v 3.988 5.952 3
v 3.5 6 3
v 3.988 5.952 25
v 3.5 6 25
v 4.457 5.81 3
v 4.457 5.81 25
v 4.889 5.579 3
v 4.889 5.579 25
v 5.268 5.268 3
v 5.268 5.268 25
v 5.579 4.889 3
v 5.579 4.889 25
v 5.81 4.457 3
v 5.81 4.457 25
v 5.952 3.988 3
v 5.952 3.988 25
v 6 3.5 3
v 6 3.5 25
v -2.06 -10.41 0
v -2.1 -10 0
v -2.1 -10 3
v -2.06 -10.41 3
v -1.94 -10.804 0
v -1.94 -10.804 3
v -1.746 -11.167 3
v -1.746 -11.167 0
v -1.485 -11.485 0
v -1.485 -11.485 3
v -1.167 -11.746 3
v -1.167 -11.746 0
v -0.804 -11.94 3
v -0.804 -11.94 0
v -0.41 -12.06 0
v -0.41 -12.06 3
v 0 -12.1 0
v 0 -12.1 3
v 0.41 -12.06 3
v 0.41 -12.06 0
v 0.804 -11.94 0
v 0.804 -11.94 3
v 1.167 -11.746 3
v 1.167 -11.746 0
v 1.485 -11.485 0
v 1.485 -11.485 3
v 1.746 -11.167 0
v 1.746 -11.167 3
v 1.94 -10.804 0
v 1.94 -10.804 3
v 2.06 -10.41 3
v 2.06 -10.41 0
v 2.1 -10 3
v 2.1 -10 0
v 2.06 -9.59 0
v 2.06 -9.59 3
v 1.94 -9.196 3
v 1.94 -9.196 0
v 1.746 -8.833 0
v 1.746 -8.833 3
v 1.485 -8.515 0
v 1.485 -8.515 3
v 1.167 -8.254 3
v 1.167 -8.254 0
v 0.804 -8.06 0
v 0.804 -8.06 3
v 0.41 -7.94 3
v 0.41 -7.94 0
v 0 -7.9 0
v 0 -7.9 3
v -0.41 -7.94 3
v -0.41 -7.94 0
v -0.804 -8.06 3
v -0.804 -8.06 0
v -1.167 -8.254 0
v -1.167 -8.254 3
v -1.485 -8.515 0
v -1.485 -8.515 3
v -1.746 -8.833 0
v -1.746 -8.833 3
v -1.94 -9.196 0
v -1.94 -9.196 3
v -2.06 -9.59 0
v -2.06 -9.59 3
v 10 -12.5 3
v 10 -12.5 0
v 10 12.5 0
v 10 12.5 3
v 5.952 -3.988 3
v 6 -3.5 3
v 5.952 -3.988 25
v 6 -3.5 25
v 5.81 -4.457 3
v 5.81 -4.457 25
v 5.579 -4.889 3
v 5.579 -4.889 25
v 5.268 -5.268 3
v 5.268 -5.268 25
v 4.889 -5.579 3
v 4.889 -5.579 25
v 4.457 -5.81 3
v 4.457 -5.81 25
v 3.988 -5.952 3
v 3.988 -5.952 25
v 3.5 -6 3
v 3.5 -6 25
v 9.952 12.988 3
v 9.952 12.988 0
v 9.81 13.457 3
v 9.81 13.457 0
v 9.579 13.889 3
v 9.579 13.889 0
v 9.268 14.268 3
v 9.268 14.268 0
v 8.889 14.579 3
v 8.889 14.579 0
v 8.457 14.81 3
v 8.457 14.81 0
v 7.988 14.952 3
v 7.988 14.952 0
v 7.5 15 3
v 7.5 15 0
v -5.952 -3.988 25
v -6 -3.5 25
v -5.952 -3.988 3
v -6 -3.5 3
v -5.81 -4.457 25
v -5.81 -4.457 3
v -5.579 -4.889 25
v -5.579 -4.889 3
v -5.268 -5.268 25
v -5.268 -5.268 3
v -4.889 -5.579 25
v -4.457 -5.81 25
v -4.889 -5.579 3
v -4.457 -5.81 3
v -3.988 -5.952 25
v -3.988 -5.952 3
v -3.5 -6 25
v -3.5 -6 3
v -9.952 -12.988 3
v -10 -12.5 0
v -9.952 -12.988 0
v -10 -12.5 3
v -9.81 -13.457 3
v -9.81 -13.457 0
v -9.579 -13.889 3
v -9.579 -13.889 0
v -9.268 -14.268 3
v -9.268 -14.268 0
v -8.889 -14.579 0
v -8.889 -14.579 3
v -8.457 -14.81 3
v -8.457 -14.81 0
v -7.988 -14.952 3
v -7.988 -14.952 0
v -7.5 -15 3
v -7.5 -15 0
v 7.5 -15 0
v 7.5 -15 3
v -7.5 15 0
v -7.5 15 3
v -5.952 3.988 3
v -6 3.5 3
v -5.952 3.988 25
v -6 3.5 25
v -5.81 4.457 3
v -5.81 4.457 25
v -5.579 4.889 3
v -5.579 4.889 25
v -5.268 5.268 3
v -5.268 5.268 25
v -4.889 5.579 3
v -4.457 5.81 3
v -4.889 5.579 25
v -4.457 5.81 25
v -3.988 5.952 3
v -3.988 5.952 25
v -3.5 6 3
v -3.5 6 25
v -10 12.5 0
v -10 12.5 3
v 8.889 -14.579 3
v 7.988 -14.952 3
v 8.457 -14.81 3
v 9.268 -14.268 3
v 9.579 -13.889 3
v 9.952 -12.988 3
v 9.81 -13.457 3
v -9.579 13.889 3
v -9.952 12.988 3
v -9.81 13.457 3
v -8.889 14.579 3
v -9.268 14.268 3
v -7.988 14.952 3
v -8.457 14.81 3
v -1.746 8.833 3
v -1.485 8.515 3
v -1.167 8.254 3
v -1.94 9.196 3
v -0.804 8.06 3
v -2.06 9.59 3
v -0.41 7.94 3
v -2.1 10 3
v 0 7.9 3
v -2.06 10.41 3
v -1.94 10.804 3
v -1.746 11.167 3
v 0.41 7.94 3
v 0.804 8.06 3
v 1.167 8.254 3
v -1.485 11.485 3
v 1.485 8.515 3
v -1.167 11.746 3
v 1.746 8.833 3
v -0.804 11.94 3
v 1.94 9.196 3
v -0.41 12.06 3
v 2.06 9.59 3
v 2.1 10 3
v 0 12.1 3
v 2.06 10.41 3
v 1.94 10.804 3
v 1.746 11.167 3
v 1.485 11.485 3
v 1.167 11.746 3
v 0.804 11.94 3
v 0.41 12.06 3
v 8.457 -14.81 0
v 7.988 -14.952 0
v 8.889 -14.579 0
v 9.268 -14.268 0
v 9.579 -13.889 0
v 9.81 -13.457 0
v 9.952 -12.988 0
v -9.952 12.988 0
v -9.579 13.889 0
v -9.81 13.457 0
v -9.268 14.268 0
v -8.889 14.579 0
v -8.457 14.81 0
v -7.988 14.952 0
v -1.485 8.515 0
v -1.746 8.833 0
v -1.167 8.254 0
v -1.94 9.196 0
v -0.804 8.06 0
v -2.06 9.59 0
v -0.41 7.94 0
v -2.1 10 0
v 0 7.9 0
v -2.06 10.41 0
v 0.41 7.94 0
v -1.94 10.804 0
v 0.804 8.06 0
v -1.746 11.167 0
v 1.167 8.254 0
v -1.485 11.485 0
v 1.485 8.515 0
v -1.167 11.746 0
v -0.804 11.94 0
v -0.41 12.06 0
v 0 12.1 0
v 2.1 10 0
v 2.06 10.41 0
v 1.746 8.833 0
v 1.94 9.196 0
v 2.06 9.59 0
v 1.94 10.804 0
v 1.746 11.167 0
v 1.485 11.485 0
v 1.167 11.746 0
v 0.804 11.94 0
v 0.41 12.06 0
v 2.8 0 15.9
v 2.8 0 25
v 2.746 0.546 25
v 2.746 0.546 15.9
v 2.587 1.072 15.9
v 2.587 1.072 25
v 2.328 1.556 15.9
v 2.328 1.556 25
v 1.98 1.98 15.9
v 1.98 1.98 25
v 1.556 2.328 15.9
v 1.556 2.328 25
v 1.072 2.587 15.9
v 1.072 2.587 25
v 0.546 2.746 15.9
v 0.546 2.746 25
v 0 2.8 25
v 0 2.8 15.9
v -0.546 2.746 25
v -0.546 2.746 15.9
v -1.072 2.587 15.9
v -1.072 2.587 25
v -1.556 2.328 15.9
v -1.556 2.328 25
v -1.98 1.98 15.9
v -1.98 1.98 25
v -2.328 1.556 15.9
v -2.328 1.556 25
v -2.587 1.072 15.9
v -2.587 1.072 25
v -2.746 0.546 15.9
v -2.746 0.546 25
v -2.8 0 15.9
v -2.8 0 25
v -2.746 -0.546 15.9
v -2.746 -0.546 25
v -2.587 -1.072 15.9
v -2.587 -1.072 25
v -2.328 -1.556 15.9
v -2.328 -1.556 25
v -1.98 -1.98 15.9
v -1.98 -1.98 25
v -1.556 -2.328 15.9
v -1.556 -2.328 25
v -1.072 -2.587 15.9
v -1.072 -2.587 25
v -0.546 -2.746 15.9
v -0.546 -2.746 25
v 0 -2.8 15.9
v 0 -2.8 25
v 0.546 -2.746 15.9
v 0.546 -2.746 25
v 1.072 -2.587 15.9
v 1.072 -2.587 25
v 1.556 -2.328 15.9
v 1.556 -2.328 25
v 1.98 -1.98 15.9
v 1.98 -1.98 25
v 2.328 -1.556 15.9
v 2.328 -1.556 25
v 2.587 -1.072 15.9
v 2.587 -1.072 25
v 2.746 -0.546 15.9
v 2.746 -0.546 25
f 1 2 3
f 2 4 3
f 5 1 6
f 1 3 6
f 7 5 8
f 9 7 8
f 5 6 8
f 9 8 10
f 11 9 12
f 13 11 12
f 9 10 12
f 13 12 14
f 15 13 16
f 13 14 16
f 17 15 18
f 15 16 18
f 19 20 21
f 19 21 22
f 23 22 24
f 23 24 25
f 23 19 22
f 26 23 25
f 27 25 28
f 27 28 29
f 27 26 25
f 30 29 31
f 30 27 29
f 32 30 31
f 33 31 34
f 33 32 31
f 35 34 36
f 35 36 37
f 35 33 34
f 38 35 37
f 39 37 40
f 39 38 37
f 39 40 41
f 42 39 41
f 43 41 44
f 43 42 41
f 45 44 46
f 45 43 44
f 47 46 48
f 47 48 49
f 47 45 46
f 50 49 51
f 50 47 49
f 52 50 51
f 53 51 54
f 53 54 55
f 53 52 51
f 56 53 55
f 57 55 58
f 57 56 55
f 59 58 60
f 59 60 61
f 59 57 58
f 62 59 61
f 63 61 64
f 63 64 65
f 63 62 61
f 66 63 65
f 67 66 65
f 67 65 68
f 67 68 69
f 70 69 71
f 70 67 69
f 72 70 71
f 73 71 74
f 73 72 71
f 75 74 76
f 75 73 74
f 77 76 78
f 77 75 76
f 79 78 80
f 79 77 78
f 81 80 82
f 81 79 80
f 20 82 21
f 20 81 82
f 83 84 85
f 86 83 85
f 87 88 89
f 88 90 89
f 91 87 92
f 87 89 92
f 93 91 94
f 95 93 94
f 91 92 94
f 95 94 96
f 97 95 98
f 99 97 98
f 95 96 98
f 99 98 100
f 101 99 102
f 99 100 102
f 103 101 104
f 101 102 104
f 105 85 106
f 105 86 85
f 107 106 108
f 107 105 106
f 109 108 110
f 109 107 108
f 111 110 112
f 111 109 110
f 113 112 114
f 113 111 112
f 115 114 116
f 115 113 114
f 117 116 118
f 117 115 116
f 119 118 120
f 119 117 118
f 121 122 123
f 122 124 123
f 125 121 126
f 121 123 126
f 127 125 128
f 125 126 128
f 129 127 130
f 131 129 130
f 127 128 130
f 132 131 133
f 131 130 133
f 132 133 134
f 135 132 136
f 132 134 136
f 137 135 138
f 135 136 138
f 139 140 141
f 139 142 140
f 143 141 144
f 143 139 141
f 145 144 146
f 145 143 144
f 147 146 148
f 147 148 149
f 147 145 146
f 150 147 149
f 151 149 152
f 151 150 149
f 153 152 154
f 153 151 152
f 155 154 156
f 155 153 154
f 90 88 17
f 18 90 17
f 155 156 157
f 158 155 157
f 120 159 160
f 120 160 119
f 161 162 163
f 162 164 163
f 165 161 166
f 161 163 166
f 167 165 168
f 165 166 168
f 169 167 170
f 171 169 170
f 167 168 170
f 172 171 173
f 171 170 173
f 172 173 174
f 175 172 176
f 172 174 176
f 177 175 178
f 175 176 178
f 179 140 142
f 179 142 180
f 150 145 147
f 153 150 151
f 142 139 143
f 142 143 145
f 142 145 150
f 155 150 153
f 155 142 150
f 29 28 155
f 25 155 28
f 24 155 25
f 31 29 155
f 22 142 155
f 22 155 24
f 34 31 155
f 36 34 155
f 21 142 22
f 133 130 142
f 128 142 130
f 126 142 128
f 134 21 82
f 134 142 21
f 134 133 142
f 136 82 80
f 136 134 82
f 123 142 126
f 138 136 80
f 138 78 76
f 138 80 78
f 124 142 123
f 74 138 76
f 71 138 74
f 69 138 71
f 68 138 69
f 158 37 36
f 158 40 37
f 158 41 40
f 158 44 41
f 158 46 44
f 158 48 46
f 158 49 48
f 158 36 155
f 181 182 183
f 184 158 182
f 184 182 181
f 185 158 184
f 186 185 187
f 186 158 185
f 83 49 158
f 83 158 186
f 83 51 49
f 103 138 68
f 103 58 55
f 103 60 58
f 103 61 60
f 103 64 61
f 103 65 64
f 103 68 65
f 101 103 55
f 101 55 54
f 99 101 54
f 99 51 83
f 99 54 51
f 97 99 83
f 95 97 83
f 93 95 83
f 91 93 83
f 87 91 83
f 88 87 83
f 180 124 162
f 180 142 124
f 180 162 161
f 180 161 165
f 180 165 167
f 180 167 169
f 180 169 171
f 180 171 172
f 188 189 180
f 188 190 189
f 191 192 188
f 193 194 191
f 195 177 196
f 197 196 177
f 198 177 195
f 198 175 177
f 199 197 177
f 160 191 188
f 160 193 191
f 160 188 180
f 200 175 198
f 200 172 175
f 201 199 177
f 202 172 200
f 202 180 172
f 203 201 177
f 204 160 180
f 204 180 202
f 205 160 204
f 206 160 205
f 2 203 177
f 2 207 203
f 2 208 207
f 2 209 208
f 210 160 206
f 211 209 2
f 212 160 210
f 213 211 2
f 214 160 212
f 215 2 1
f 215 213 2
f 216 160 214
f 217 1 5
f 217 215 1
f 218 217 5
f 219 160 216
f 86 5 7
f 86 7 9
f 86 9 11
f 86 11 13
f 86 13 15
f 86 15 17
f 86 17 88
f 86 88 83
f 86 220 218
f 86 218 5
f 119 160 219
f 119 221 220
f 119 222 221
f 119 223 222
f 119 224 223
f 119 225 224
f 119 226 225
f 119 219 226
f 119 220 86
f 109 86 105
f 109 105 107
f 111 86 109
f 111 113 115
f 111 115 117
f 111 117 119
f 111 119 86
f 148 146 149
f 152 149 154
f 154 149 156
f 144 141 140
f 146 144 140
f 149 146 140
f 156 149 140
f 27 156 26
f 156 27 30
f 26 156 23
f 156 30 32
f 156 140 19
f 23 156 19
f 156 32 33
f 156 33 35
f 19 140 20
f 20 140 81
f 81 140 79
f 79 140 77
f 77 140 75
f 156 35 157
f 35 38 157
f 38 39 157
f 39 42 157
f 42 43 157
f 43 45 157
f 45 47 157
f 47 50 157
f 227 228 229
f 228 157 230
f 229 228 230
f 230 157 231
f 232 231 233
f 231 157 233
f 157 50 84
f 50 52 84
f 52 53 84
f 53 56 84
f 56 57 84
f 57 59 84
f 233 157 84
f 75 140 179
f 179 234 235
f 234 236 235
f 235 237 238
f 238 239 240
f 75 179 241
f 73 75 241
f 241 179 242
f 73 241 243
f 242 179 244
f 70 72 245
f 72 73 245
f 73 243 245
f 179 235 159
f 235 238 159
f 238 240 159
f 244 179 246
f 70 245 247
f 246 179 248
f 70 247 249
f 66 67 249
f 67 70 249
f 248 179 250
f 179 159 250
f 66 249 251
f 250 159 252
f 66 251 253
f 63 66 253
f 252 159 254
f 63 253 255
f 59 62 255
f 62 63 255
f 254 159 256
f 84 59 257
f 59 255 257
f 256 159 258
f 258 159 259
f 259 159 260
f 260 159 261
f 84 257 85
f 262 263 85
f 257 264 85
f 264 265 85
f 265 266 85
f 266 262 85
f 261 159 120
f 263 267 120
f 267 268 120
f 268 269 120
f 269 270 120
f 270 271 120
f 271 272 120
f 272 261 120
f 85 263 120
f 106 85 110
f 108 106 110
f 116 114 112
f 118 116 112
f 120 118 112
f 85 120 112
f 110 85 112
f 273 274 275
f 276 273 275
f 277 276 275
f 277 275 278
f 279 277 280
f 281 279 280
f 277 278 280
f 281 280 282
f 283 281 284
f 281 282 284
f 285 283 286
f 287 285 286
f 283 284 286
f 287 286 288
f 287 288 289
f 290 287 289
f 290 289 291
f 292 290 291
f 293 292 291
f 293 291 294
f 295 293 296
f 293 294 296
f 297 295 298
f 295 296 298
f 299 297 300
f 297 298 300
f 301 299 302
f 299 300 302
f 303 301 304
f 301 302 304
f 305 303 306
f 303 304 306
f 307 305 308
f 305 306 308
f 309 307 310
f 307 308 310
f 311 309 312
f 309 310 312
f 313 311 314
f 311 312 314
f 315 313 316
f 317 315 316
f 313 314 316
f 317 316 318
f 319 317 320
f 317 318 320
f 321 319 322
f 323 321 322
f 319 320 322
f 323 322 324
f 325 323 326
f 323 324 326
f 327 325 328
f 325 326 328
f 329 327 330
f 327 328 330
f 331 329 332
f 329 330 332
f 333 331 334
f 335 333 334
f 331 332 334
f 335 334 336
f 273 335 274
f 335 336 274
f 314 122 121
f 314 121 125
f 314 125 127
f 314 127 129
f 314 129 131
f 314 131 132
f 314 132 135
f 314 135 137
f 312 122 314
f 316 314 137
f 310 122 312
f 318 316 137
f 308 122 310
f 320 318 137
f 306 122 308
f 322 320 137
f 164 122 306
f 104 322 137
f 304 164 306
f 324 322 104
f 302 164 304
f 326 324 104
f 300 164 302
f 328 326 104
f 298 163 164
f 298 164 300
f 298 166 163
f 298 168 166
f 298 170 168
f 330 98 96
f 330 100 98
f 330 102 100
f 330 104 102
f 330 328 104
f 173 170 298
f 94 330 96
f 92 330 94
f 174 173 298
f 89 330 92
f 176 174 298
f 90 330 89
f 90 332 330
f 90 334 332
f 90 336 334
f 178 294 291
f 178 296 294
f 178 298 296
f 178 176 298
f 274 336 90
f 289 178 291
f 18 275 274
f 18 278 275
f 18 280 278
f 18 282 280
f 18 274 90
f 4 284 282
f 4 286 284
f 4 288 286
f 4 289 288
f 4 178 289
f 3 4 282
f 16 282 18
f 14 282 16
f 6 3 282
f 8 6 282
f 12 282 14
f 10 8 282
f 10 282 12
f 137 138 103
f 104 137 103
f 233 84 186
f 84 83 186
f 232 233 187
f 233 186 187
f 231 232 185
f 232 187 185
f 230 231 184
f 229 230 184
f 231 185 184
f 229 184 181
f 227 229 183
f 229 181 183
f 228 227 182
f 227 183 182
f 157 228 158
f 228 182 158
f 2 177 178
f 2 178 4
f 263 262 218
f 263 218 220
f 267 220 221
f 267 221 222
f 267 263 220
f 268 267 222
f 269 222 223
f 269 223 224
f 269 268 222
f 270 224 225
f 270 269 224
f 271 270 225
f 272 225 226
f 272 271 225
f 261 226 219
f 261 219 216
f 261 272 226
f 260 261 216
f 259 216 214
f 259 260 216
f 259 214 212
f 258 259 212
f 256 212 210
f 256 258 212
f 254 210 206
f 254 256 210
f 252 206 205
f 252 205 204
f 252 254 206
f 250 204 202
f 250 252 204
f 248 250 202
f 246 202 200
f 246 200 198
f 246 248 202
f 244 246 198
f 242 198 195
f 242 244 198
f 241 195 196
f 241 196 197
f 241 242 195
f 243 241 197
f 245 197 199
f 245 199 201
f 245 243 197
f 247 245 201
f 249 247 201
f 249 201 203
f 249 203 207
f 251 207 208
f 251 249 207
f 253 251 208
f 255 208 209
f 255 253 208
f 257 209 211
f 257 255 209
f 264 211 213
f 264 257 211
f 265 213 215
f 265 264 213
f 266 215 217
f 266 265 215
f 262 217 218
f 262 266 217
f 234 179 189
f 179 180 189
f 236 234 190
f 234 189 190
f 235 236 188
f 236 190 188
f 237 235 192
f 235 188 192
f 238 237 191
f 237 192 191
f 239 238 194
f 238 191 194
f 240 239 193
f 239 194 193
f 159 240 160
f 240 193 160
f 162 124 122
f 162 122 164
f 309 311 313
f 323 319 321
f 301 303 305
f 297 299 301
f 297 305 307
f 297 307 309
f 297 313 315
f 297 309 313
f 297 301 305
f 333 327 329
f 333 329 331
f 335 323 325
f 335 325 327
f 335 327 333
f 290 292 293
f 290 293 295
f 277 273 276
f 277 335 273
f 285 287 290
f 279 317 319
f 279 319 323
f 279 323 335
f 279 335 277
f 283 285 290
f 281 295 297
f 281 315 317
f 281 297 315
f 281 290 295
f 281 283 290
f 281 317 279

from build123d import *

# Parameters (mm, degrees)
ESQUISSE1_W             = 20
ESQUISSE1_H             = 30
ESQUISSE1_R             = 2.1
BOSS_EXTRU_1_DEPTH      = 3
ESQUISSE2_W             = 12
ESQUISSE2_H             = 12
BOSS_EXTRU_2_DEPTH      = 22
ESQUISSE3_OUTSIDE_W     = 30.774
ESQUISSE3_OUTSIDE_H     = 40.774
ESQUISSE3_OUTSIDE_W_2   = 12
ESQUISSE3_OUTSIDE_H_2   = 12
ESQUISSE3_OUTSIDE_R     = 2.8
ENL_V_MAT_EXTRU_1_DEPTH = 9.1
CONG_1_R                = 2.5


with BuildPart() as part:
    # Esquisse1 → Boss.-Extru.1 (new body)
    with BuildSketch(Plane.XY):
        Rectangle(ESQUISSE1_W, ESQUISSE1_H)
        with Locations((0, 10)):
            Circle(ESQUISSE1_R, mode=Mode.SUBTRACT)
        with Locations(Location((0, -10, 0), (0, 0, 180))):
            Circle(ESQUISSE1_R, mode=Mode.SUBTRACT)
    extrude(amount=BOSS_EXTRU_1_DEPTH)

    # Esquisse2 → Boss.-Extru.2 (add)
    with BuildSketch(Plane.XY.offset(3)):
        Rectangle(ESQUISSE2_W, ESQUISSE2_H)
    extrude(amount=BOSS_EXTRU_2_DEPTH)

    # Esquisse3 outside → Enlèv. mat.-Extru.1 (cut)
    # profile 1 of 2: a face of its own
    with BuildSketch(Plane.XY.offset(25)):
        Rectangle(ESQUISSE3_OUTSIDE_W, ESQUISSE3_OUTSIDE_H)
        Rectangle(ESQUISSE3_OUTSIDE_W_2, ESQUISSE3_OUTSIDE_H_2, mode=Mode.SUBTRACT)
    # profile 2 of 2: a face of its own
    with BuildSketch(Plane.XY.offset(25)):
        Circle(ESQUISSE3_OUTSIDE_R)
    extrude(amount=-ENL_V_MAT_EXTRU_1_DEPTH, mode=Mode.SUBTRACT)

    # Congé1
    cong_1_edges = [part.edges().sort_by_distance(p)[0] for p in [
        (-6, 6, 14),
        (-6, -6, 14),
        (6, -6, 14),
        (6, 6, 14),
        (-10, 15, 1.5),
        (10, 15, 1.5),
        (10, -15, 1.5),
        (-10, -15, 1.5),
    ]]
    fillet(cong_1_edges, radius=CONG_1_R)


solid = part.part
